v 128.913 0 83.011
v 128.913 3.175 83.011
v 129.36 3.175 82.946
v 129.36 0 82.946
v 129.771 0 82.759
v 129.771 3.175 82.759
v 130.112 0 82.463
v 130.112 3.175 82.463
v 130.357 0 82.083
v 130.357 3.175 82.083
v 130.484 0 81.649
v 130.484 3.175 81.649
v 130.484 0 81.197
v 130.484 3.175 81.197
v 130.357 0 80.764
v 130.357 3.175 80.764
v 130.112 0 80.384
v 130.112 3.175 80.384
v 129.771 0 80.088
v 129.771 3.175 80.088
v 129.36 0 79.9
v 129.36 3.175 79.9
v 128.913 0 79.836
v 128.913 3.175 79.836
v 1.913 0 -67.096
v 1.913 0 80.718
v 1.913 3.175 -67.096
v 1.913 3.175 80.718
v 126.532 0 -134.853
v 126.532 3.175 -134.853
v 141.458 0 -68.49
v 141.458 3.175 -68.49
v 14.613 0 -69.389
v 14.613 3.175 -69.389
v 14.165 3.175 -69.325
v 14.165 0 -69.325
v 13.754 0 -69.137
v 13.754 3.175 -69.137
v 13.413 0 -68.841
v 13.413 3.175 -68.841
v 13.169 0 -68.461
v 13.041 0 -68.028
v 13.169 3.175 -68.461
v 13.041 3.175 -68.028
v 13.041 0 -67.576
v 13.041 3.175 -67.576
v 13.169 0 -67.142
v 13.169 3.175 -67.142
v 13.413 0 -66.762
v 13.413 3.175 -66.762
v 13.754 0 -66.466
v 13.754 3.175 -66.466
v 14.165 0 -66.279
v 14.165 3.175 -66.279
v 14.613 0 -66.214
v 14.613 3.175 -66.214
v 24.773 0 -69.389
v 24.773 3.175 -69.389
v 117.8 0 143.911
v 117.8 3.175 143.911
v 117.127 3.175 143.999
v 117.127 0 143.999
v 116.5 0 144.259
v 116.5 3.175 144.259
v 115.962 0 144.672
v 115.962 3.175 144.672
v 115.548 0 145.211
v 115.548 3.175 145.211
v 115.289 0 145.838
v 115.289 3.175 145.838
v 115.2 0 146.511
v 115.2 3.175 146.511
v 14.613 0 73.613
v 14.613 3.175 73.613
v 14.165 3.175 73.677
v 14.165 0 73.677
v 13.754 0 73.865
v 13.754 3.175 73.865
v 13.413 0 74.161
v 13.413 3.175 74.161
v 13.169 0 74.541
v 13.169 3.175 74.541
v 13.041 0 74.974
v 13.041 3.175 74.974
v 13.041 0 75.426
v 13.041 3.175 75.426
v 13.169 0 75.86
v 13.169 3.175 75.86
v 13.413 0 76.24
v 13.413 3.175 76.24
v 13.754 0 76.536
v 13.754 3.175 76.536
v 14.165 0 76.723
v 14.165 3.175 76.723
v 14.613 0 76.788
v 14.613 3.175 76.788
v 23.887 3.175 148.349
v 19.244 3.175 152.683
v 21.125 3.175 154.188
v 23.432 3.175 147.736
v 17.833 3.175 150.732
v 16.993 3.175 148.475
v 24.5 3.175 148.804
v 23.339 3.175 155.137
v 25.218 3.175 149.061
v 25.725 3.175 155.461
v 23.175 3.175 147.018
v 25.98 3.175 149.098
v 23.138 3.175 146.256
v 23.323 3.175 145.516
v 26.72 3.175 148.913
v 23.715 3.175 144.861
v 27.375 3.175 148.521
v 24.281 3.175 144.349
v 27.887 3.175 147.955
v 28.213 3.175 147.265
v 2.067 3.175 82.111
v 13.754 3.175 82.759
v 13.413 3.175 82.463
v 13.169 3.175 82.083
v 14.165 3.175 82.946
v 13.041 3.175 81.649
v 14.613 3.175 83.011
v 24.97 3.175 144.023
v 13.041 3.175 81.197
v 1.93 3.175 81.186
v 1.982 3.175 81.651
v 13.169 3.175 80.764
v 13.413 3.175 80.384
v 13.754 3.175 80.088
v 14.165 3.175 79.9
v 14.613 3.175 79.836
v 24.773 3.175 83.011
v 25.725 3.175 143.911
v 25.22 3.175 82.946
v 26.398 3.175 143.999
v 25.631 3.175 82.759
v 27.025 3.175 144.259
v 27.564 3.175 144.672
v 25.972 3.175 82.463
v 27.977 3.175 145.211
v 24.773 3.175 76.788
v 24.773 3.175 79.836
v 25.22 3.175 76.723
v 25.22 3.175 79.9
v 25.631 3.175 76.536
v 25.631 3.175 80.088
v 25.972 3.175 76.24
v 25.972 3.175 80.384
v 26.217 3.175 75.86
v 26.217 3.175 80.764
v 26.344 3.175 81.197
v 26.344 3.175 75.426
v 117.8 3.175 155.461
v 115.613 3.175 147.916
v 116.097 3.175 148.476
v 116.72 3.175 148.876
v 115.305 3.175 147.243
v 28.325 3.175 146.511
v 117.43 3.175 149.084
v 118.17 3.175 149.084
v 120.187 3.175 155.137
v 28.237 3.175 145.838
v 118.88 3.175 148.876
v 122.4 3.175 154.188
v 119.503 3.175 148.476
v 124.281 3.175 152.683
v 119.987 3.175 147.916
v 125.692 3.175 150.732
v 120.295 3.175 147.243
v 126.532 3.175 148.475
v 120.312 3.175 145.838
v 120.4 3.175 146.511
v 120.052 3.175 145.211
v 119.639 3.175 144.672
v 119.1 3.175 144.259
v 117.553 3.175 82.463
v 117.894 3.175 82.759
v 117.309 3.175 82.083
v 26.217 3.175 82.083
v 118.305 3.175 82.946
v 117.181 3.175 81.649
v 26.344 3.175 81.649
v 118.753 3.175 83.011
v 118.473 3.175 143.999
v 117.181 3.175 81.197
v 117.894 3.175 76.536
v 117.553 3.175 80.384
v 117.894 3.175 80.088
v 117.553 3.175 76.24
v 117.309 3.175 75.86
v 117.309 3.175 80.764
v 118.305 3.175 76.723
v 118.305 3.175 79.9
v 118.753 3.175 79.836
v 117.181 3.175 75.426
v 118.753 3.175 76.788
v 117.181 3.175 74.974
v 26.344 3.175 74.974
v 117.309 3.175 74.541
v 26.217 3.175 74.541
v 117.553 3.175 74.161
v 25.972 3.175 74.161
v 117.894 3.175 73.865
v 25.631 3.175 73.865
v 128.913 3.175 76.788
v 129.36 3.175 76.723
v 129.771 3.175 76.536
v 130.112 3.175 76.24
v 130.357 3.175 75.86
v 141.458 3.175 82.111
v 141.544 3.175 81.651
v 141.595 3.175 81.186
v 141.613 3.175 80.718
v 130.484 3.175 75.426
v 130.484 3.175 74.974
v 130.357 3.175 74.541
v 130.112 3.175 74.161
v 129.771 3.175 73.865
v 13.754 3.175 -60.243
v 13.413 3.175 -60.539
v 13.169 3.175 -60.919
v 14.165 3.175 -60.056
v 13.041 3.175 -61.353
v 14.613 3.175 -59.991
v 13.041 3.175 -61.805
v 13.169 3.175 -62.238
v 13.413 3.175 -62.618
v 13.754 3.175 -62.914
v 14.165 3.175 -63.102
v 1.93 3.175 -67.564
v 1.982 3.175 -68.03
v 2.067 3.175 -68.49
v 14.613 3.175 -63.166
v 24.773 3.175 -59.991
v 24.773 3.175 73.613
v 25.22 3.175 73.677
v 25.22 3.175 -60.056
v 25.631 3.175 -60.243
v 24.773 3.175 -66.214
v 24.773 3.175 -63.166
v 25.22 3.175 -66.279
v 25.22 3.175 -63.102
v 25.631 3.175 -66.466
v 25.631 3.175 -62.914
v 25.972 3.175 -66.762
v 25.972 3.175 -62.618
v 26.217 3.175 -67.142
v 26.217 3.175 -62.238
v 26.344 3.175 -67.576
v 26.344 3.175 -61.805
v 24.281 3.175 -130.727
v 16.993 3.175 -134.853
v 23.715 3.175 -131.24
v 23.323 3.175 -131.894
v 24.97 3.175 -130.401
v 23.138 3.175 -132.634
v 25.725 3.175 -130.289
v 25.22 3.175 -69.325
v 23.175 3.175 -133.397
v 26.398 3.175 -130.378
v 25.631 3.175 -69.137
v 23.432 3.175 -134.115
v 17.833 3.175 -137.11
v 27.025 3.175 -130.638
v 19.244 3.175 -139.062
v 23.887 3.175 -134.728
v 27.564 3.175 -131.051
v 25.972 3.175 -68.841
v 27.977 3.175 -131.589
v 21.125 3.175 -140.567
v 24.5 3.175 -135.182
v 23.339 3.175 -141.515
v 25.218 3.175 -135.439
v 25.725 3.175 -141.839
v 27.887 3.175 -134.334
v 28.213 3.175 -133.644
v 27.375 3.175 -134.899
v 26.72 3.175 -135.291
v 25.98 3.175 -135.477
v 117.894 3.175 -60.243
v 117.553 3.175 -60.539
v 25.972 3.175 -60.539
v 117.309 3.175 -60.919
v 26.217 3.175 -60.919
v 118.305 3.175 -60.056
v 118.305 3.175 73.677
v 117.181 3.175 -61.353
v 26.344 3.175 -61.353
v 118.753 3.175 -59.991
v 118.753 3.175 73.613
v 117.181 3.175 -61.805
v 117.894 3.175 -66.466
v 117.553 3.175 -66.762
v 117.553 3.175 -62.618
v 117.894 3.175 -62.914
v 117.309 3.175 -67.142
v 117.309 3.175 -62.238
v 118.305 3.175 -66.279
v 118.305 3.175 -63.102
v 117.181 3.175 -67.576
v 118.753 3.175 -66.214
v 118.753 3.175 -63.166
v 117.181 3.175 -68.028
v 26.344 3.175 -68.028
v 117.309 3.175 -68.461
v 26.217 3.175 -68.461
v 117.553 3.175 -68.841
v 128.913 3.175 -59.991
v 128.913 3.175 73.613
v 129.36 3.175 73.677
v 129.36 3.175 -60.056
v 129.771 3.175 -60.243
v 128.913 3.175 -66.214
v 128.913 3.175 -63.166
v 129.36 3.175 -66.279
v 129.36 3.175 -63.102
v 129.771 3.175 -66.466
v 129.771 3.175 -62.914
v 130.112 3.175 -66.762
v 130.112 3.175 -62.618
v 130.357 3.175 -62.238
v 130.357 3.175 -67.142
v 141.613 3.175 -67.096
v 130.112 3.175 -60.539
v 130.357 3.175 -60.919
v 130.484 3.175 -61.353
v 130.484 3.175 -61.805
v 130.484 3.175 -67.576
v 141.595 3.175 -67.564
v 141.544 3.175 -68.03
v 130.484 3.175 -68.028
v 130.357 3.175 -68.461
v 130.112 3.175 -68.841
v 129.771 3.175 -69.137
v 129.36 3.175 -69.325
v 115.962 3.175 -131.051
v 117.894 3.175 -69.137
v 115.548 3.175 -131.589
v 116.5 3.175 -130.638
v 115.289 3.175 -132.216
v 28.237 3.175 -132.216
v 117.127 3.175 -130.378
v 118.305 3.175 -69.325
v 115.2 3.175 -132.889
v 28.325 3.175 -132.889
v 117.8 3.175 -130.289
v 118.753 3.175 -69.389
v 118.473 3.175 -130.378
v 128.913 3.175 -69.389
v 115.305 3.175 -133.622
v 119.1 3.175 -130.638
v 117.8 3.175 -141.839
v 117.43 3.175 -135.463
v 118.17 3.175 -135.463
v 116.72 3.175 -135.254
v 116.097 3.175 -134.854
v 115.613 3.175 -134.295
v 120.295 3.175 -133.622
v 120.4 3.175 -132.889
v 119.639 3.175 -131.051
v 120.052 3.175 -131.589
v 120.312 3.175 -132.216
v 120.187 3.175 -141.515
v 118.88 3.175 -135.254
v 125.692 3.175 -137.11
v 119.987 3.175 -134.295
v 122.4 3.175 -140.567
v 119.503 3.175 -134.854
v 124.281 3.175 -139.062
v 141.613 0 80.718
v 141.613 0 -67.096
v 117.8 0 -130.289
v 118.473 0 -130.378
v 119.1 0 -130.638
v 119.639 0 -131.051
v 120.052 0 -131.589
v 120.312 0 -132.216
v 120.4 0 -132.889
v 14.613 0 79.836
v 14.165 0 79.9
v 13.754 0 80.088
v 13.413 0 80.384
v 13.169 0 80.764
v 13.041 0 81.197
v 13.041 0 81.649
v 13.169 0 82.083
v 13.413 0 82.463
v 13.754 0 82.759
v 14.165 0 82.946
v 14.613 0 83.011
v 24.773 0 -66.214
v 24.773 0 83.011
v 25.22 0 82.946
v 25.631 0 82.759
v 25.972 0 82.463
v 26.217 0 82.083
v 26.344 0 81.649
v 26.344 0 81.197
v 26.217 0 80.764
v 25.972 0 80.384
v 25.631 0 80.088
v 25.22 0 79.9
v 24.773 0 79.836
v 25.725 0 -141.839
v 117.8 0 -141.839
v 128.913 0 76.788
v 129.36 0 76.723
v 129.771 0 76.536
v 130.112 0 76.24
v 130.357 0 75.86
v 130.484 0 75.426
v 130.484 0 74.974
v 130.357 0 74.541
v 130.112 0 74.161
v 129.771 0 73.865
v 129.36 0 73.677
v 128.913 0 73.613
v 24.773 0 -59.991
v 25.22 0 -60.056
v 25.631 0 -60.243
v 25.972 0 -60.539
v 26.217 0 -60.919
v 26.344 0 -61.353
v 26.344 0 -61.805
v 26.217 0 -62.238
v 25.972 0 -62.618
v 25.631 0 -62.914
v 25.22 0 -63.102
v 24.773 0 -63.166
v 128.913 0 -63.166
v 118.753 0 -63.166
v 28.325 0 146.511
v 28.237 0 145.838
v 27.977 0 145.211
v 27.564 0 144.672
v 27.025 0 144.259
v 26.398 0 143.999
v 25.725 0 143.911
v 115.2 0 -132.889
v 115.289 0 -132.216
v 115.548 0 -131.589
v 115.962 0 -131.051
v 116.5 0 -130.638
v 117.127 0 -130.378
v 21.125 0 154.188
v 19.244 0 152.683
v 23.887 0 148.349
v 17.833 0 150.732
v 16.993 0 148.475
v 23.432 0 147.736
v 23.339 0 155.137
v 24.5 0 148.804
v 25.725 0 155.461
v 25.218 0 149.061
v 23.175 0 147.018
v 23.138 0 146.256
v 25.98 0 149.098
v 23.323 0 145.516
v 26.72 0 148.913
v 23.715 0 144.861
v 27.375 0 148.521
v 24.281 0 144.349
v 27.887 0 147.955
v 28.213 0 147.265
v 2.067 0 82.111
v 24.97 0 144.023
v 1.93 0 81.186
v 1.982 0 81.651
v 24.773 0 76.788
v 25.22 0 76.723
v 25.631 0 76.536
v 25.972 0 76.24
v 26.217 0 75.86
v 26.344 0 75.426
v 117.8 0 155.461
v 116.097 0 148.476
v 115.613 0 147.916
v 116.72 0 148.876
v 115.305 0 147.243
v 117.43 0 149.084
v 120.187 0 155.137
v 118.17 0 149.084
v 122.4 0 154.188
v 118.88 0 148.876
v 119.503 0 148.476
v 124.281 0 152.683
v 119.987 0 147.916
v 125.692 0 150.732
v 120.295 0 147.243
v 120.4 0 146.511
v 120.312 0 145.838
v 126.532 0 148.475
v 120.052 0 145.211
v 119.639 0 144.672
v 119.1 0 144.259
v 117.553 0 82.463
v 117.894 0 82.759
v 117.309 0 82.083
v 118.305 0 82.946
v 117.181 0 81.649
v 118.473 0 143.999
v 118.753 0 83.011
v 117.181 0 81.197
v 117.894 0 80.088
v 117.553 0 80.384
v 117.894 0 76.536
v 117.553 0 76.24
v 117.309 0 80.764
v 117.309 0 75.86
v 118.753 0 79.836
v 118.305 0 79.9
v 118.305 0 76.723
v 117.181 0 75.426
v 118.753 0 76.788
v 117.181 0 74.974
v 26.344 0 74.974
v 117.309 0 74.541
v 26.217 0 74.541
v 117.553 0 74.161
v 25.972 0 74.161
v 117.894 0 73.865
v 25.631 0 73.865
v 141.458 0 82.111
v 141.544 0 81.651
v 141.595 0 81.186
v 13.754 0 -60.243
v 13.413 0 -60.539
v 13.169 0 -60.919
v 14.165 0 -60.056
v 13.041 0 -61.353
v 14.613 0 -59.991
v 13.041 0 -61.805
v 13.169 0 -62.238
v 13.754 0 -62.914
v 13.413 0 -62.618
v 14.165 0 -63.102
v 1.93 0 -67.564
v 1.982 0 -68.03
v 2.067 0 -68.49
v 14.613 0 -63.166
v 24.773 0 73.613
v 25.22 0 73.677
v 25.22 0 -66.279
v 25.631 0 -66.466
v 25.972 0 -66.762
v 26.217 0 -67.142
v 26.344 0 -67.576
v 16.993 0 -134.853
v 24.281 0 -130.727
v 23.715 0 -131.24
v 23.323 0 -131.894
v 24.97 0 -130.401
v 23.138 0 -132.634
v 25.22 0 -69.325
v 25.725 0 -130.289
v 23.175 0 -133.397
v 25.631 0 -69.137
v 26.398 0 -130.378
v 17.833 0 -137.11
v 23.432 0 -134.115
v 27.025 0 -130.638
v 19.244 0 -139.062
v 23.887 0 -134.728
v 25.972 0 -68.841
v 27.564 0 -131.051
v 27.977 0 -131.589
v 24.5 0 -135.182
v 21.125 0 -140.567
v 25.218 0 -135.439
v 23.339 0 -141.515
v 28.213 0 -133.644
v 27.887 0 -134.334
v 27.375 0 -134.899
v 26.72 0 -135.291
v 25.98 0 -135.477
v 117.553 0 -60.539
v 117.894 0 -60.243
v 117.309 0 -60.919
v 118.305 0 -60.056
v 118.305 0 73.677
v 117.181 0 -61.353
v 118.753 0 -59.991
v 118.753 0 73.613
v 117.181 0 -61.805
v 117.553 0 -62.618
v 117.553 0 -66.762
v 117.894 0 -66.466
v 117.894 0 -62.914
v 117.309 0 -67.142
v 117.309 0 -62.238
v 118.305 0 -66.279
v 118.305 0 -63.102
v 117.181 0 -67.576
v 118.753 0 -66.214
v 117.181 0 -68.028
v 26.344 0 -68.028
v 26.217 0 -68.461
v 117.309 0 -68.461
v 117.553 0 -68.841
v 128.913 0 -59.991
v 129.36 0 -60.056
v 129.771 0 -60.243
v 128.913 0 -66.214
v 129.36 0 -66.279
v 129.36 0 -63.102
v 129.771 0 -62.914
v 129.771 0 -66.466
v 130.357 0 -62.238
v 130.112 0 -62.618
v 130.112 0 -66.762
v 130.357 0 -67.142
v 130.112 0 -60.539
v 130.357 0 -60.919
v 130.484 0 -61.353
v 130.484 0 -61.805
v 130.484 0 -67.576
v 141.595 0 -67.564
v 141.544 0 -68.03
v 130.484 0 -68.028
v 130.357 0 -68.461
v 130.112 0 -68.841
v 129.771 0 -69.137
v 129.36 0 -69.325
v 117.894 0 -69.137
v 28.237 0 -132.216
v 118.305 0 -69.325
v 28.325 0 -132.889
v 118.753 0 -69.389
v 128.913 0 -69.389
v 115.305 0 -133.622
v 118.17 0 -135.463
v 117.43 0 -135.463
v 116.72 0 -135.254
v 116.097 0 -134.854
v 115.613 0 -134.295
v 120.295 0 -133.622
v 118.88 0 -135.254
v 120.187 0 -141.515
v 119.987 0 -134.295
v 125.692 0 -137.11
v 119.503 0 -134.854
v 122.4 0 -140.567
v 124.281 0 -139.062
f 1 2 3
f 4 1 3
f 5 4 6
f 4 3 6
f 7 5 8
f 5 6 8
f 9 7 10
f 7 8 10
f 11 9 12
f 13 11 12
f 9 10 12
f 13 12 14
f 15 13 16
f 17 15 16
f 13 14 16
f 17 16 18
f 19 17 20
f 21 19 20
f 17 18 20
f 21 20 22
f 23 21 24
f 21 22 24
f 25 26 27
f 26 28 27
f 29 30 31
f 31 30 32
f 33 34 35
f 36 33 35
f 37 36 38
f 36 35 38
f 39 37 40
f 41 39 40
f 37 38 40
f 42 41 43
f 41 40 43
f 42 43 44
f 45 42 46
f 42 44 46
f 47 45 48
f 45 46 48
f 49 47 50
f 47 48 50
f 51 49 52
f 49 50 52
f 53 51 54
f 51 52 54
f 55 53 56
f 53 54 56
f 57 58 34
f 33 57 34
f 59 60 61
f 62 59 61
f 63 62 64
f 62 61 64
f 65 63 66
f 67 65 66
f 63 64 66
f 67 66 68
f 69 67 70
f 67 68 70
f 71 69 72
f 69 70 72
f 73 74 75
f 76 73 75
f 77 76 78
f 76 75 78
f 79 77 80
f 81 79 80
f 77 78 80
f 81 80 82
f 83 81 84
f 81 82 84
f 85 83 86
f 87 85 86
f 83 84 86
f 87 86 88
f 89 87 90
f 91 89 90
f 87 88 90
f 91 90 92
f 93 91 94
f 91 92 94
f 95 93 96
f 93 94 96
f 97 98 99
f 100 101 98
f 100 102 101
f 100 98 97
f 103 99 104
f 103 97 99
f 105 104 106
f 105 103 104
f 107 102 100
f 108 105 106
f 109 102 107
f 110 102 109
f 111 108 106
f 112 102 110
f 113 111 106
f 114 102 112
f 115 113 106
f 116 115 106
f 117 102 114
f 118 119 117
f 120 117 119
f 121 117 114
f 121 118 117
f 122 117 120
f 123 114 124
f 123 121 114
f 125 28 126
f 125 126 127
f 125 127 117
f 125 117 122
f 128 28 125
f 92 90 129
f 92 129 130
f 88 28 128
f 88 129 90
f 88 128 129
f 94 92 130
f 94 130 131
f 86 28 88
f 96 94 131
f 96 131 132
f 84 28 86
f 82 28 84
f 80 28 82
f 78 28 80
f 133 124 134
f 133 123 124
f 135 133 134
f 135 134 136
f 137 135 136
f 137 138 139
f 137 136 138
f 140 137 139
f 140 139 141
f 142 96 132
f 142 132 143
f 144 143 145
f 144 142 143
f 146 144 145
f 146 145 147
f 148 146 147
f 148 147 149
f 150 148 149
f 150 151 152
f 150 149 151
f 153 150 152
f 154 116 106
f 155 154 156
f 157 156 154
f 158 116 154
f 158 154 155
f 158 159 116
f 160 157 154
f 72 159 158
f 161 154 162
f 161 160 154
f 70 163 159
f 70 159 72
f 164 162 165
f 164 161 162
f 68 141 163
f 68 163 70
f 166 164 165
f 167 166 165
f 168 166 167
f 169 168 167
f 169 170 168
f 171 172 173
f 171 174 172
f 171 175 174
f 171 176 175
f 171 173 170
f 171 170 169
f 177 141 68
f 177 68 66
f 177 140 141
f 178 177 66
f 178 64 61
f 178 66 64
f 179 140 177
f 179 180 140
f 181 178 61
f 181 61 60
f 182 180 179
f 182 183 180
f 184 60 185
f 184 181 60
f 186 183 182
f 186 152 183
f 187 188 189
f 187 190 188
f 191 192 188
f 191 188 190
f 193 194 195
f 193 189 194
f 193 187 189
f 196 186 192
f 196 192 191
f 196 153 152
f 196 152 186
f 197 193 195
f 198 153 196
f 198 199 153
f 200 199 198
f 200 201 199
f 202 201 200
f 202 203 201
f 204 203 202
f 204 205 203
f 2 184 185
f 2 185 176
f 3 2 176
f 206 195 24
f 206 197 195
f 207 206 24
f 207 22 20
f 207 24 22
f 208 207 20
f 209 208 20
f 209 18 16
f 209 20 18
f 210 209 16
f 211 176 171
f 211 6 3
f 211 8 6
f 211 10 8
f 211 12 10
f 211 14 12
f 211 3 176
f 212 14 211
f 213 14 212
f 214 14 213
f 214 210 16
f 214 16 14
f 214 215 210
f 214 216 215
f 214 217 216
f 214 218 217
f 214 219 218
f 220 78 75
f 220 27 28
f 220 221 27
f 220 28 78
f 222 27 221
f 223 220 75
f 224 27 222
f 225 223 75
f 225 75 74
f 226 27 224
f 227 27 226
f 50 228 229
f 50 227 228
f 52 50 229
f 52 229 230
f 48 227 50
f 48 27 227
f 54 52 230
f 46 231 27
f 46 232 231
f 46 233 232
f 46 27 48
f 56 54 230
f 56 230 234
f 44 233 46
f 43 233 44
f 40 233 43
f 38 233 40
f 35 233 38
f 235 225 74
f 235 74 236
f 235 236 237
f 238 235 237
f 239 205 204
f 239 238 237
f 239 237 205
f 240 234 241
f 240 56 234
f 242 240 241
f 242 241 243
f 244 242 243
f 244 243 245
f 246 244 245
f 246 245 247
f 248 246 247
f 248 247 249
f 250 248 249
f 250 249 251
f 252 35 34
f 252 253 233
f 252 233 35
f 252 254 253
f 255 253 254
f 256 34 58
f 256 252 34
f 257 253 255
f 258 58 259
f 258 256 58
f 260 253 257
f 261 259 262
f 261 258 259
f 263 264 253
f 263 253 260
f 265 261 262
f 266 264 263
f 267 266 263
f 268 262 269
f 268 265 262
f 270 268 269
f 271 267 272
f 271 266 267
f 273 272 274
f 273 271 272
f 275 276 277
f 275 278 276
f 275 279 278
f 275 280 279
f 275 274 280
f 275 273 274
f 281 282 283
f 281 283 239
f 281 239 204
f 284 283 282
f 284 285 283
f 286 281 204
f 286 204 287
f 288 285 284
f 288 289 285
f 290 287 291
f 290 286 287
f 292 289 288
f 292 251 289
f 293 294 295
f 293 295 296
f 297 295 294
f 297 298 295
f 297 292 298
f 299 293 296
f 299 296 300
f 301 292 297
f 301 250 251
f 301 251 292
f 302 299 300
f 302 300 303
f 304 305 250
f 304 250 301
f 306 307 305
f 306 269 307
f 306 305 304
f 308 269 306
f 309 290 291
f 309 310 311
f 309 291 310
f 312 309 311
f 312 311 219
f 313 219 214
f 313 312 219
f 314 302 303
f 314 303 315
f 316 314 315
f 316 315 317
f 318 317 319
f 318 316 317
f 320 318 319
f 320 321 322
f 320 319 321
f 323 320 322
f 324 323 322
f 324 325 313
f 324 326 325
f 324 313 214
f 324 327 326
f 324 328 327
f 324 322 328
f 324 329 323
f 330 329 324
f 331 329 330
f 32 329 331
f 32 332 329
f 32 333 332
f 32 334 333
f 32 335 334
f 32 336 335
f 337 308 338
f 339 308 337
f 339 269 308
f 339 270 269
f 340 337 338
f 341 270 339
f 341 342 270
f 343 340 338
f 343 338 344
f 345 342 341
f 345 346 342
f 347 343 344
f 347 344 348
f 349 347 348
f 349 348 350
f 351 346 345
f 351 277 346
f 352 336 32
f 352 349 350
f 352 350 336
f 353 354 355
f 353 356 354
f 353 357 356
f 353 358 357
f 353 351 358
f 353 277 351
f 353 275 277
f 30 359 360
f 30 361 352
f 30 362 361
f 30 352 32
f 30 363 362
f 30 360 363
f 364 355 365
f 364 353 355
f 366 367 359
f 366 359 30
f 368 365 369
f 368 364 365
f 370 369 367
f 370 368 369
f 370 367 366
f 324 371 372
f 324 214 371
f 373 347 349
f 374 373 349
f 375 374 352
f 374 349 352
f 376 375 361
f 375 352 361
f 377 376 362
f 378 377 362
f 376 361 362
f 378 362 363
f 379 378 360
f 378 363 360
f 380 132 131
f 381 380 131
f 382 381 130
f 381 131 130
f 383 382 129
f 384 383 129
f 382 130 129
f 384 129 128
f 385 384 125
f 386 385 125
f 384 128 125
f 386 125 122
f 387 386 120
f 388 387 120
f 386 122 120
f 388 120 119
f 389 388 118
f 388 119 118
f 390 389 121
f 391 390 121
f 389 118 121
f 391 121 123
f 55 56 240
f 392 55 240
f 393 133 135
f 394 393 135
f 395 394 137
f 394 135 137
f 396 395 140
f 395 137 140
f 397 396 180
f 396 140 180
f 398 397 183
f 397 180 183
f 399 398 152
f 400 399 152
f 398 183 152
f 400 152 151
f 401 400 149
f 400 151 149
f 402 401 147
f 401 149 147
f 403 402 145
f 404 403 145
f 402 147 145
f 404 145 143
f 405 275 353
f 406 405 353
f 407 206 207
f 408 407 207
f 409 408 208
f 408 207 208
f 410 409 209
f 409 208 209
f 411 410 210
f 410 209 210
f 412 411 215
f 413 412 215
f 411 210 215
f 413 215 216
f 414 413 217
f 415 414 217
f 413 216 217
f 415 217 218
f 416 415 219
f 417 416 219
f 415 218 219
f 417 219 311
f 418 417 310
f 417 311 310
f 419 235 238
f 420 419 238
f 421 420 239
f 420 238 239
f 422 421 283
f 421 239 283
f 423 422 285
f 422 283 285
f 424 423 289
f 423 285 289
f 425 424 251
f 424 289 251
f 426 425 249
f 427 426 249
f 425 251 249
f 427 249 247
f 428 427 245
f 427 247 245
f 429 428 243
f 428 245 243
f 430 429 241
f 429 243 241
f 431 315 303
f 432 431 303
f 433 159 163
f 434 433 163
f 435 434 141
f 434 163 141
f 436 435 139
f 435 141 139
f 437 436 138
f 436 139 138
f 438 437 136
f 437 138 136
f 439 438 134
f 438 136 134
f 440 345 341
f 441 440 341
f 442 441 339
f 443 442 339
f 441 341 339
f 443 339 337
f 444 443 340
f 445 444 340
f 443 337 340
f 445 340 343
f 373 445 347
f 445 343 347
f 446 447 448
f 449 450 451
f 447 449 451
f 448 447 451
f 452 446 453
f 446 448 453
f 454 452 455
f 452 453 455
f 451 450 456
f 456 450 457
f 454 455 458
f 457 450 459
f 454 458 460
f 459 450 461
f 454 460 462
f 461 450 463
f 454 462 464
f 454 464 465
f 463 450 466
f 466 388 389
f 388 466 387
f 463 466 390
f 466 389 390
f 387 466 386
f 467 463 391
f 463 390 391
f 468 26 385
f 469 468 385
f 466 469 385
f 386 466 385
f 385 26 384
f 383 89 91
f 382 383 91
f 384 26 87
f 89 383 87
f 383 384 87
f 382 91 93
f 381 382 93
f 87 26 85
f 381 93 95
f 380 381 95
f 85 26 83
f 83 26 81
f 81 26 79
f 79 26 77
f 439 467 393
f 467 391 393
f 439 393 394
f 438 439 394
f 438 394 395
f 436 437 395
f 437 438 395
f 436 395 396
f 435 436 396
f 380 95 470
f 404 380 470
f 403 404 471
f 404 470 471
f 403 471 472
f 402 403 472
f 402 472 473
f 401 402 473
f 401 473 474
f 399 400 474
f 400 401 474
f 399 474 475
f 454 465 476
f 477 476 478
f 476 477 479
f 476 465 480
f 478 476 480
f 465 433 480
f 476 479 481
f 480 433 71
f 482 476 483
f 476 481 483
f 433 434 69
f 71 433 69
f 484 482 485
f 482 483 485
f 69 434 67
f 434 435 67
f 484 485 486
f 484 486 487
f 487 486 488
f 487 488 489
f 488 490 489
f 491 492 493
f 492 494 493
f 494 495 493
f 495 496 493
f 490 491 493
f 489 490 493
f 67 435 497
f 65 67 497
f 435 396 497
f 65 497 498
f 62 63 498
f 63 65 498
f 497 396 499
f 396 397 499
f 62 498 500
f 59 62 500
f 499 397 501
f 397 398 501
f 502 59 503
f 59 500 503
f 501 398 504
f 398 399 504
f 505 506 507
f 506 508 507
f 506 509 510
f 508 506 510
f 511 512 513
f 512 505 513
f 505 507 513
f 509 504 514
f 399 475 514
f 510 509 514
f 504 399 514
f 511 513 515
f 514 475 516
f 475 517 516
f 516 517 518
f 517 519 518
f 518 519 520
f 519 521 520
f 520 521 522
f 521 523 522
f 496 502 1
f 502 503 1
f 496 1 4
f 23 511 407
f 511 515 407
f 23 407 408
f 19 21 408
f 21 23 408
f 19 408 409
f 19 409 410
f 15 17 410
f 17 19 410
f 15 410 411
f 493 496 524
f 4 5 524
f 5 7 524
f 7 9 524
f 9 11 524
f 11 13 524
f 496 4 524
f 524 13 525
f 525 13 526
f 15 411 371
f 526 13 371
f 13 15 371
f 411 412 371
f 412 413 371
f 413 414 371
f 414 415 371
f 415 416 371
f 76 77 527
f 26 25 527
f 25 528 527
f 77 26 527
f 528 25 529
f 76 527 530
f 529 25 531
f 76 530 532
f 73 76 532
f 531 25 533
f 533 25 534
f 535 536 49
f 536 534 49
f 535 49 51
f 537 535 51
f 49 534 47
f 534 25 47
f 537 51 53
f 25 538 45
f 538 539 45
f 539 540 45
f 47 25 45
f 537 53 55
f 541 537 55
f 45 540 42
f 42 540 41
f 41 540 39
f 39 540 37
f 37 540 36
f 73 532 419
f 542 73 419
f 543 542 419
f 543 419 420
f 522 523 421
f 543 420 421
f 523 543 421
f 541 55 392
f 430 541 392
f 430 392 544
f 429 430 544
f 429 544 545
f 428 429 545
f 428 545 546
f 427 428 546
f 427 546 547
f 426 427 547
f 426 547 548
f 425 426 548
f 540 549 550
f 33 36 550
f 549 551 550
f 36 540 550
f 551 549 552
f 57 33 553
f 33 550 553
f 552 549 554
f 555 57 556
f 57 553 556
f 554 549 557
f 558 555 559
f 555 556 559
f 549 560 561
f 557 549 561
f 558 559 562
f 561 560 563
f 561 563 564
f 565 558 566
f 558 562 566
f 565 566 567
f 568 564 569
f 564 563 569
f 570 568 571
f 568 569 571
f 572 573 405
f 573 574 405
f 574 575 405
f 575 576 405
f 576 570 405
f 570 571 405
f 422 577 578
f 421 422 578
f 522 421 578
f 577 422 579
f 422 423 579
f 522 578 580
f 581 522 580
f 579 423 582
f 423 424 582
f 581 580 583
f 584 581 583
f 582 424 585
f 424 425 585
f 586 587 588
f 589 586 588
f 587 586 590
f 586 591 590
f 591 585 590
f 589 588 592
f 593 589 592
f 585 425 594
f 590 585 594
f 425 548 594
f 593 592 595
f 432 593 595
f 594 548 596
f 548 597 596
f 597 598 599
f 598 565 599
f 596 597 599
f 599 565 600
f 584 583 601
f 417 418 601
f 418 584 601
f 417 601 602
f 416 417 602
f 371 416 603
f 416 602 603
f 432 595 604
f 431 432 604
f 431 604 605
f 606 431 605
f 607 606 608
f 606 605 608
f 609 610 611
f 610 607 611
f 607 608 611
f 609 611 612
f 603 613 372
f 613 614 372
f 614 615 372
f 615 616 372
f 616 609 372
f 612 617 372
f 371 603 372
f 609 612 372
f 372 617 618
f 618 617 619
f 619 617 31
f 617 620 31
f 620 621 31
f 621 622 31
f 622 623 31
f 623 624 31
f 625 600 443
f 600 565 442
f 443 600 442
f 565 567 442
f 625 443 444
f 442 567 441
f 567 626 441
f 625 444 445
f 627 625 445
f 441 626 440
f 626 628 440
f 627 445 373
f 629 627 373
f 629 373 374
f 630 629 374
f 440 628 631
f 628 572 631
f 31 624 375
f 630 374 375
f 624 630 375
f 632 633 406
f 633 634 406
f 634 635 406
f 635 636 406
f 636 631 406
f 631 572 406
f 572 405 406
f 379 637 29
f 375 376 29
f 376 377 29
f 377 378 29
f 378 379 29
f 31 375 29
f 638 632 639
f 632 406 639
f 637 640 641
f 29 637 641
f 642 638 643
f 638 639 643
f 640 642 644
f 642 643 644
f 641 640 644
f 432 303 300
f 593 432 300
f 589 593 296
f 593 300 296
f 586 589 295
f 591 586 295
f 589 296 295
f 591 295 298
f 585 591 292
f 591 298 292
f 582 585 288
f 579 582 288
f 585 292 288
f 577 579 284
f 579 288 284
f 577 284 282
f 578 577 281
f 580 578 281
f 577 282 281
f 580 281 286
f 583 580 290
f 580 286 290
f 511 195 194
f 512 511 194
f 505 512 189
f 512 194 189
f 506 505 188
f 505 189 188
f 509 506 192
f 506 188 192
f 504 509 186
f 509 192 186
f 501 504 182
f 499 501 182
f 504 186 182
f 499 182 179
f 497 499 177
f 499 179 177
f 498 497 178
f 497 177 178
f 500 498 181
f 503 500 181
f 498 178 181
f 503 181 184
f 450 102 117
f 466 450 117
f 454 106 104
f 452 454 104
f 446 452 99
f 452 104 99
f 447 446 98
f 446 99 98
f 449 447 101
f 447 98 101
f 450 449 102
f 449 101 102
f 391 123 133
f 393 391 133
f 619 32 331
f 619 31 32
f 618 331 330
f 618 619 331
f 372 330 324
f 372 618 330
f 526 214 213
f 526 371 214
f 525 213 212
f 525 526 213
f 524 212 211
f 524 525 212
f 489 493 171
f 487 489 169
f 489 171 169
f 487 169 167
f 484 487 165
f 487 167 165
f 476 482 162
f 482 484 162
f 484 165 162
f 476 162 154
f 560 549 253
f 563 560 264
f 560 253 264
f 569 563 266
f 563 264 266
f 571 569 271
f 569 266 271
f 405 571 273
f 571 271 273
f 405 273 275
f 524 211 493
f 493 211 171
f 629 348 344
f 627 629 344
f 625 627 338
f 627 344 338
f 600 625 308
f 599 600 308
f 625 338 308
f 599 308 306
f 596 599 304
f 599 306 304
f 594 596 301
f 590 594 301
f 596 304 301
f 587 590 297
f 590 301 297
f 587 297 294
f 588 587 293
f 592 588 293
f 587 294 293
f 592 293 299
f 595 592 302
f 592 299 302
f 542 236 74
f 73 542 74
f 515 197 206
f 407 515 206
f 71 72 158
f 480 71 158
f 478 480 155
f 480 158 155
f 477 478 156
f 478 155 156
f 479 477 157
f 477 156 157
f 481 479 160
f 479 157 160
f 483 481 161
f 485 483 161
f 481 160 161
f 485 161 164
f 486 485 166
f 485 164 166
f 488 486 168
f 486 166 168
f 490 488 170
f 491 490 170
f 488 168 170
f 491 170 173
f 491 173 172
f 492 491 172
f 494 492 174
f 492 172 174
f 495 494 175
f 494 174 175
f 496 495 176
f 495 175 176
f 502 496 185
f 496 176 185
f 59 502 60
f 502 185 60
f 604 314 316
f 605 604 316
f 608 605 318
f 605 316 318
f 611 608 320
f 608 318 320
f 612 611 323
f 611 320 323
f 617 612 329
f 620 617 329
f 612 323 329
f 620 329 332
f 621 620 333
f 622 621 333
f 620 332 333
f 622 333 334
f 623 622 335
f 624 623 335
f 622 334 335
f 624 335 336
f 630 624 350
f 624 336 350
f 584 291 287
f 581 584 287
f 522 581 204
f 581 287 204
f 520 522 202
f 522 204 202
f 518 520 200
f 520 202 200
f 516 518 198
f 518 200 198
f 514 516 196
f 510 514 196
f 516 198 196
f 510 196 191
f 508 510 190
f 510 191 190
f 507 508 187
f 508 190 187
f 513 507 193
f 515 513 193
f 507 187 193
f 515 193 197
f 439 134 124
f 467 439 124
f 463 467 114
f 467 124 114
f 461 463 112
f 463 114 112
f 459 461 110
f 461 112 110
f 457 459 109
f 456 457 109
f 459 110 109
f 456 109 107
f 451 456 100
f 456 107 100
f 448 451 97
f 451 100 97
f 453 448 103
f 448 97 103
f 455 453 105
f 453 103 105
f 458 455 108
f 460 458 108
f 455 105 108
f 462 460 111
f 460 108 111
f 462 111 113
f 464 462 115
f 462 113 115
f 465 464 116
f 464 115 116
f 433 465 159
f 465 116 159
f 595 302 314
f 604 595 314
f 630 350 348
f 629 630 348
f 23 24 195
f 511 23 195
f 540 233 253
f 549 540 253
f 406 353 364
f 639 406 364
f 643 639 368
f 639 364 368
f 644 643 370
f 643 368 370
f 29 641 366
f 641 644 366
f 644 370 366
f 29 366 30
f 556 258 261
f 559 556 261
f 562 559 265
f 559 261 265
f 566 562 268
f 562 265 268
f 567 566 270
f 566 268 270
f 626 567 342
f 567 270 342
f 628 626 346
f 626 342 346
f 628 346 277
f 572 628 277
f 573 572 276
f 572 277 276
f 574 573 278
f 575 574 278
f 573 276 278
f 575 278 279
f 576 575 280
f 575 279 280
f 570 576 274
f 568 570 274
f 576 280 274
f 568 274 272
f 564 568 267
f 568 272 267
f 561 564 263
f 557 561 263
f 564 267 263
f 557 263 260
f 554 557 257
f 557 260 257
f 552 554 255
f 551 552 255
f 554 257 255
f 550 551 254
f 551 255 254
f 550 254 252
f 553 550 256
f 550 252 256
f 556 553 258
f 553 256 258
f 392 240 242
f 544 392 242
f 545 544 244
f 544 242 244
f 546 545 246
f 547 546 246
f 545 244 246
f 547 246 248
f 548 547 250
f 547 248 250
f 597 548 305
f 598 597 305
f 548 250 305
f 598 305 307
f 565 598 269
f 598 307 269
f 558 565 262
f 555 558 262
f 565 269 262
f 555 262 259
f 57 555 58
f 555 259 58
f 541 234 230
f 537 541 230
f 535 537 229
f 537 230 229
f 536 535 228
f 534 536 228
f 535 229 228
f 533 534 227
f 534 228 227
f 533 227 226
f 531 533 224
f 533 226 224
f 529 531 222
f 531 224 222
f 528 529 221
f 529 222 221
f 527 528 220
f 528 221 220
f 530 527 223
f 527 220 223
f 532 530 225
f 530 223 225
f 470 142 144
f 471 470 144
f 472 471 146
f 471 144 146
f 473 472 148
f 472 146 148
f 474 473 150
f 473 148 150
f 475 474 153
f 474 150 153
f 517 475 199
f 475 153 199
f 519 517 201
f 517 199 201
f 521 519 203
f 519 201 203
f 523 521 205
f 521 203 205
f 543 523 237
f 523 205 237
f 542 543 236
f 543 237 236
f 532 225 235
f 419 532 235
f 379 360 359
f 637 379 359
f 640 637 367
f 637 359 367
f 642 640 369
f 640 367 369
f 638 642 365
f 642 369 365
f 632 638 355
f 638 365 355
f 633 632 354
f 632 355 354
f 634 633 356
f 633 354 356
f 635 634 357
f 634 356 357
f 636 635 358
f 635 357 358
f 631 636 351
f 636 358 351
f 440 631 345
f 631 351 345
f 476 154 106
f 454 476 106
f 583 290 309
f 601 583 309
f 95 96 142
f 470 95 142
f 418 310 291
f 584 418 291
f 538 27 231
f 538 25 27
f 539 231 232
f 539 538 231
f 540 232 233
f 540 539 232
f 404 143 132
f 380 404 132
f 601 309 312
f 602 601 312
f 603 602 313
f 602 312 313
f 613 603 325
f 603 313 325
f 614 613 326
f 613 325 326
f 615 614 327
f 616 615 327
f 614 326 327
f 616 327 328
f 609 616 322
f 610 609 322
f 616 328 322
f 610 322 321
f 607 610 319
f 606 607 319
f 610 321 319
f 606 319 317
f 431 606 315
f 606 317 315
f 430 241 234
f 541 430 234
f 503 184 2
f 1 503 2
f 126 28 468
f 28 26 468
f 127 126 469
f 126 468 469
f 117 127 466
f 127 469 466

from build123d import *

# Parameters (mm, degrees)
SKETCH1_W               = 283.466794954
SKETCH1_H               = 183.213286571
BOSS_EXTRUDE1_DEPTH     = 3.175
SKETCH2_W               = 283.466794954
SKETCH2_H               = 183.213286571
CUT_EXTRUDE1_DEPTH      = 4.175
SKETCH4_W               = 139.7
SKETCH4_H               = 76.2
BOSS_EXTRUDE2_DEPTH     = 3.175
CUT_EXTRUDE2_DEPTH      = 4.175
CUT_EXTRUDE3_DEPTH      = 1
CUT_EXTRUDE3_DEPTH_BACK = 4.175
FILLET1_R               = 6.35


with BuildPart() as part:
    # Sketch1 → Boss-Extrude1 (new body)
    with BuildSketch(Plane(origin=(0, 0, 0), x_dir=(1, 0, 0), z_dir=(0, 1, 0))):
        with Locations((1.754436397, -4.260774107)):
            Rectangle(SKETCH1_W, SKETCH1_H)
    extrude(amount=BOSS_EXTRUDE1_DEPTH)

    # Sketch2 → Cut-Extrude1 (cut, through all)
    with BuildSketch(Plane(origin=(0, 3.175, 0), x_dir=(1, 0, 0), z_dir=(0, 1, 0))):
        with Locations((1.754436397, -4.260774107)):
            Rectangle(SKETCH2_W, SKETCH2_H)
        Polygon((14.612631792, -92.535731899), (1.912631792, -92.535731899), (1.912631792, -79.835731899), (1.912631792, 78.914268101), (141.612631792, 78.914268101), (141.612631792, -79.835731899), (141.612631792, -92.535731899), (128.912631792, -92.535731899), align=None, mode=Mode.SUBTRACT)
        with BuildLine():
            Line((24.772631792, 63.166268101), (14.612631792, 63.166268101))
            Line((14.612631792, 63.166268101), (14.612631792, 59.991268101))
            Line((14.612631792, 59.991268101), (24.772631792, 59.991268101))
            ThreePointArc((24.772631792, 59.991268101), (26.360131792, 61.578768101), (24.772631792, 63.166268101))
        make_face()
        with BuildLine():
            Line((14.612631792, 59.991268101), (14.612631792, 63.166268101))
            ThreePointArc((14.612631792, 63.166268101), (13.025131792, 61.578768101), (14.612631792, 59.991268101))
        make_face()
        with BuildLine():
            ThreePointArc((14.612631792, 69.389268101), (13.025131792, 67.801768101), (14.612631792, 66.214268101))
            Line((14.612631792, 66.214268101), (24.772631792, 66.214268101))
            ThreePointArc((24.772631792, 66.214268101), (26.360131792, 67.801768101), (24.772631792, 69.389268101))
            Line((24.772631792, 69.389268101), (14.612631792, 69.389268101))
        make_face()
        with BuildLine():
            Line((128.912631792, 63.166268101), (118.752631792, 63.166268101))
            ThreePointArc((118.752631792, 63.166268101), (117.165131792, 61.578768101), (118.752631792, 59.991268101))
            Line((118.752631792, 59.991268101), (128.912631792, 59.991268101))
            Line((128.912631792, 59.991268101), (128.912631792, 63.166268101))
        make_face()
        with BuildLine():
            ThreePointArc((118.752631792, 69.389268101), (117.165131792, 67.801768101), (118.752631792, 66.214268101))
            Line((118.752631792, 66.214268101), (128.912631792, 66.214268101))
            ThreePointArc((128.912631792, 66.214268101), (130.500131792, 67.801768101), (128.912631792, 69.389268101))
            Line((128.912631792, 69.389268101), (118.752631792, 69.389268101))
        make_face()
        with BuildLine():
            ThreePointArc((128.912631792, -83.010731899), (130.500131792, -81.423231899), (128.912631792, -79.835731899))
            Line((128.912631792, -79.835731899), (118.752631792, -79.835731899))
            ThreePointArc((118.752631792, -79.835731899), (117.165131792, -81.423231899), (118.752631792, -83.010731899))
            Line((118.752631792, -83.010731899), (128.912631792, -83.010731899))
        make_face()
        with BuildLine():
            ThreePointArc((128.912631792, -76.787731899), (130.500131792, -75.200231899), (128.912631792, -73.612731899))
            Line((128.912631792, -73.612731899), (128.912631792, -76.787731899))
        make_face()
        with BuildLine():
            Line((128.912631792, -76.787731899), (128.912631792, -73.612731899))
            Line((128.912631792, -73.612731899), (118.752631792, -73.612731899))
            ThreePointArc((118.752631792, -73.612731899), (117.165131792, -75.200231899), (118.752631792, -76.787731899))
            Line((118.752631792, -76.787731899), (128.912631792, -76.787731899))
        make_face()
        with BuildLine():
            ThreePointArc((128.912631792, 59.991268101), (130.500131792, 61.578768101), (128.912631792, 63.166268101))
            Line((128.912631792, 63.166268101), (128.912631792, 59.991268101))
        make_face()
        with BuildLine():
            Line((24.772631792, -79.835731899), (14.612631792, -79.835731899))
            ThreePointArc((14.612631792, -79.835731899), (13.025131792, -81.423231899), (14.612631792, -83.010731899))
            Line((14.612631792, -83.010731899), (24.772631792, -83.010731899))
            ThreePointArc((24.772631792, -83.010731899), (26.360131792, -81.423231899), (24.772631792, -79.835731899))
        make_face()
        with BuildLine():
            Line((24.772631792, -73.612731899), (14.612631792, -73.612731899))
            Line((14.612631792, -73.612731899), (14.612631792, -76.787731899))
            Line((14.612631792, -76.787731899), (24.772631792, -76.787731899))
            ThreePointArc((24.772631792, -76.787731899), (26.360131792, -75.200231899), (24.772631792, -73.612731899))
        make_face()
        with BuildLine():
            Line((14.612631792, -76.787731899), (14.612631792, -73.612731899))
            ThreePointArc((14.612631792, -73.612731899), (13.025131792, -75.200231899), (14.612631792, -76.787731899))
        make_face()
    extrude(amount=-CUT_EXTRUDE1_DEPTH, mode=Mode.SUBTRACT)

    # Sketch4 → Boss-Extrude2 (add)
    with BuildSketch(Plane(origin=(0, 3.175, 0), x_dir=(1, 0, 0), z_dir=(0, 1, 0))):
        with Locations((71.762631792, 117.014268101)):
            Rectangle(SKETCH4_W, SKETCH4_H)
        with Locations((71.762631792, -130.635731899)):
            Rectangle(SKETCH4_W, SKETCH4_H)
    extrude(amount=-BOSS_EXTRUDE2_DEPTH)

    # Sketch3 → Cut-Extrude2 (cut, through all)
    with BuildSketch(Plane(origin=(0, 3.175, 0), x_dir=(1, 0, 0), z_dir=(0, 1, 0))):
        with BuildLine():
            ThreePointArc((28.325131792, 132.889268101), (23.886654161, 134.727745733), (25.725131792, 130.289268101))
            Line((25.725131792, 130.289268101), (25.725131792, 132.889268101))
            Line((25.725131792, 132.889268101), (28.325131792, 132.889268101))
        make_face()
        with BuildLine():
            Line((25.725131792, 132.889268101), (25.725131792, 130.289268101))
            ThreePointArc((25.725131792, 130.289268101), (27.563609423, 131.05079047), (28.325131792, 132.889268101))
            Line((28.325131792, 132.889268101), (25.725131792, 132.889268101))
        make_face()
        with BuildLine():
            ThreePointArc((28.325131792, 132.889268101), (23.886654161, 134.727745733), (25.725131792, 130.289268101))
            Line((25.725131792, 130.289268101), (25.725131792, 132.889268101))
            Line((25.725131792, 132.889268101), (28.325131792, 132.889268101))
        make_face()
        with BuildLine():
            Line((25.725131792, 132.889268101), (25.725131792, 130.289268101))
            ThreePointArc((25.725131792, 130.289268101), (27.563609423, 131.05079047), (28.325131792, 132.889268101))
            Line((28.325131792, 132.889268101), (25.725131792, 132.889268101))
        make_face()
        with BuildLine():
            ThreePointArc((115.200131792, 132.889268101), (115.961654161, 131.05079047), (117.800131792, 130.289268101))
            Line((117.800131792, 130.289268101), (117.800131792, 132.889268101))
            Line((117.800131792, 132.889268101), (115.200131792, 132.889268101))
        make_face()
        with BuildLine():
            Line((117.800131792, 132.889268101), (117.800131792, 130.289268101))
            ThreePointArc((117.800131792, 130.289268101), (119.638609423, 131.05079047), (120.400131792, 132.889268101))
            ThreePointArc((120.400131792, 132.889268101), (117.800131792, 135.489268101), (115.200131792, 132.889268101))
            Line((115.200131792, 132.889268101), (117.800131792, 132.889268101))
        make_face()
        with BuildLine():
            ThreePointArc((115.200131792, 132.889268101), (115.961654161, 131.05079047), (117.800131792, 130.289268101))
            Line((117.800131792, 130.289268101), (117.800131792, 132.889268101))
            Line((117.800131792, 132.889268101), (115.200131792, 132.889268101))
        make_face()
        with BuildLine():
            Line((117.800131792, 132.889268101), (117.800131792, 130.289268101))
            ThreePointArc((117.800131792, 130.289268101), (119.638609423, 131.05079047), (120.400131792, 132.889268101))
            ThreePointArc((120.400131792, 132.889268101), (117.800131792, 135.489268101), (115.200131792, 132.889268101))
            Line((115.200131792, 132.889268101), (117.800131792, 132.889268101))
        make_face()
        with BuildLine():
            ThreePointArc((120.400131792, -146.510731899), (119.638609423, -144.672254267), (117.800131792, -143.910731899))
            Line((117.800131792, -143.910731899), (117.800131792, -146.510731899))
            Line((117.800131792, -146.510731899), (115.200131792, -146.510731899))
            ThreePointArc((115.200131792, -146.510731899), (117.800131792, -149.110731899), (120.400131792, -146.510731899))
        make_face()
        with BuildLine():
            Line((117.800131792, -146.510731899), (117.800131792, -143.910731899))
            ThreePointArc((117.800131792, -143.910731899), (115.961654161, -144.672254267), (115.200131792, -146.510731899))
            Line((115.200131792, -146.510731899), (117.800131792, -146.510731899))
        make_face()
        with BuildLine():
            ThreePointArc((120.400131792, -146.510731899), (119.638609423, -144.672254267), (117.800131792, -143.910731899))
            Line((117.800131792, -143.910731899), (117.800131792, -146.510731899))
            Line((117.800131792, -146.510731899), (115.200131792, -146.510731899))
            ThreePointArc((115.200131792, -146.510731899), (117.800131792, -149.110731899), (120.400131792, -146.510731899))
        make_face()
        with BuildLine():
            Line((117.800131792, -146.510731899), (117.800131792, -143.910731899))
            ThreePointArc((117.800131792, -143.910731899), (115.961654161, -144.672254267), (115.200131792, -146.510731899))
            Line((115.200131792, -146.510731899), (117.800131792, -146.510731899))
        make_face()
        with BuildLine():
            ThreePointArc((28.325131792, -146.510731899), (27.563609423, -144.672254267), (25.725131792, -143.910731899))
            Line((25.725131792, -143.910731899), (25.725131792, -146.510731899))
            Line((25.725131792, -146.510731899), (28.325131792, -146.510731899))
        make_face()
        with BuildLine():
            Line((25.725131792, -146.510731899), (25.725131792, -143.910731899))
            ThreePointArc((25.725131792, -143.910731899), (23.886654161, -148.34920953), (28.325131792, -146.510731899))
            Line((28.325131792, -146.510731899), (25.725131792, -146.510731899))
        make_face()
        with BuildLine():
            ThreePointArc((28.325131792, -146.510731899), (27.563609423, -144.672254267), (25.725131792, -143.910731899))
            Line((25.725131792, -143.910731899), (25.725131792, -146.510731899))
            Line((25.725131792, -146.510731899), (28.325131792, -146.510731899))
        make_face()
        with BuildLine():
            Line((25.725131792, -146.510731899), (25.725131792, -143.910731899))
            ThreePointArc((25.725131792, -143.910731899), (23.886654161, -148.34920953), (28.325131792, -146.510731899))
            Line((28.325131792, -146.510731899), (25.725131792, -146.510731899))
        make_face()
    extrude(amount=-CUT_EXTRUDE2_DEPTH, mode=Mode.SUBTRACT)

    # Sketch5 → Cut-Extrude3 (cut, two sides)
    with BuildSketch(Plane(origin=(0, 3.175, 0), x_dir=(1, 0, 0), z_dir=(0, 1, 0))) as cut_extrude3_sk:
        with BuildLine():
            Line((1.912631792, 67.801768101), (16.993258915, 134.853166283))
            ThreePointArc((16.993258915, 134.853166283), (20.133816594, 139.877808318), (25.725131792, 141.839268101))
            Line((25.725131792, 141.839268101), (117.800131792, 141.839268101))
            ThreePointArc((117.800131792, 141.839268101), (123.39144699, 139.877808318), (126.532004669, 134.853166283))
            Line((126.532004669, 134.853166283), (141.612631792, 67.801768101))
            Line((141.612631792, 67.801768101), (141.612631792, 155.114268101))
            Line((141.612631792, 155.114268101), (1.912631792, 155.114268101))
            Line((1.912631792, 155.114268101), (1.912631792, 67.801768101))
        make_face()
        with BuildLine():
            Line((16.993258915, -148.47463008), (1.912631792, -81.423231899))
            Line((1.912631792, -81.423231899), (1.912631792, -168.735731899))
            Line((1.912631792, -168.735731899), (141.612631792, -168.735731899))
            Line((141.612631792, -168.735731899), (141.612631792, -81.423231899))
            Line((141.612631792, -81.423231899), (126.532004669, -148.47463008))
            ThreePointArc((126.532004669, -148.47463008), (123.39144699, -153.499272115), (117.800131792, -155.460731899))
            Line((117.800131792, -155.460731899), (25.725131792, -155.460731899))
            ThreePointArc((25.725131792, -155.460731899), (20.133816594, -153.499272115), (16.993258915, -148.47463008))
        make_face()
    extrude(amount=CUT_EXTRUDE3_DEPTH, mode=Mode.SUBTRACT)
    extrude(cut_extrude3_sk.sketch, amount=-CUT_EXTRUDE3_DEPTH_BACK, mode=Mode.SUBTRACT)

    # Fillet1
    fillet1_edges = [part.edges().sort_by_distance(p)[0] for p in [
        (1.912631792, 1.5875, -67.801768101),
        (141.612631792, 1.5875, -67.801768101),
        (141.612631792, 1.5875, 81.423231899),
        (1.912631792, 1.5875, 81.423231899),
    ]]
    fillet(fillet1_edges, radius=FILLET1_R)


solid = part.part
